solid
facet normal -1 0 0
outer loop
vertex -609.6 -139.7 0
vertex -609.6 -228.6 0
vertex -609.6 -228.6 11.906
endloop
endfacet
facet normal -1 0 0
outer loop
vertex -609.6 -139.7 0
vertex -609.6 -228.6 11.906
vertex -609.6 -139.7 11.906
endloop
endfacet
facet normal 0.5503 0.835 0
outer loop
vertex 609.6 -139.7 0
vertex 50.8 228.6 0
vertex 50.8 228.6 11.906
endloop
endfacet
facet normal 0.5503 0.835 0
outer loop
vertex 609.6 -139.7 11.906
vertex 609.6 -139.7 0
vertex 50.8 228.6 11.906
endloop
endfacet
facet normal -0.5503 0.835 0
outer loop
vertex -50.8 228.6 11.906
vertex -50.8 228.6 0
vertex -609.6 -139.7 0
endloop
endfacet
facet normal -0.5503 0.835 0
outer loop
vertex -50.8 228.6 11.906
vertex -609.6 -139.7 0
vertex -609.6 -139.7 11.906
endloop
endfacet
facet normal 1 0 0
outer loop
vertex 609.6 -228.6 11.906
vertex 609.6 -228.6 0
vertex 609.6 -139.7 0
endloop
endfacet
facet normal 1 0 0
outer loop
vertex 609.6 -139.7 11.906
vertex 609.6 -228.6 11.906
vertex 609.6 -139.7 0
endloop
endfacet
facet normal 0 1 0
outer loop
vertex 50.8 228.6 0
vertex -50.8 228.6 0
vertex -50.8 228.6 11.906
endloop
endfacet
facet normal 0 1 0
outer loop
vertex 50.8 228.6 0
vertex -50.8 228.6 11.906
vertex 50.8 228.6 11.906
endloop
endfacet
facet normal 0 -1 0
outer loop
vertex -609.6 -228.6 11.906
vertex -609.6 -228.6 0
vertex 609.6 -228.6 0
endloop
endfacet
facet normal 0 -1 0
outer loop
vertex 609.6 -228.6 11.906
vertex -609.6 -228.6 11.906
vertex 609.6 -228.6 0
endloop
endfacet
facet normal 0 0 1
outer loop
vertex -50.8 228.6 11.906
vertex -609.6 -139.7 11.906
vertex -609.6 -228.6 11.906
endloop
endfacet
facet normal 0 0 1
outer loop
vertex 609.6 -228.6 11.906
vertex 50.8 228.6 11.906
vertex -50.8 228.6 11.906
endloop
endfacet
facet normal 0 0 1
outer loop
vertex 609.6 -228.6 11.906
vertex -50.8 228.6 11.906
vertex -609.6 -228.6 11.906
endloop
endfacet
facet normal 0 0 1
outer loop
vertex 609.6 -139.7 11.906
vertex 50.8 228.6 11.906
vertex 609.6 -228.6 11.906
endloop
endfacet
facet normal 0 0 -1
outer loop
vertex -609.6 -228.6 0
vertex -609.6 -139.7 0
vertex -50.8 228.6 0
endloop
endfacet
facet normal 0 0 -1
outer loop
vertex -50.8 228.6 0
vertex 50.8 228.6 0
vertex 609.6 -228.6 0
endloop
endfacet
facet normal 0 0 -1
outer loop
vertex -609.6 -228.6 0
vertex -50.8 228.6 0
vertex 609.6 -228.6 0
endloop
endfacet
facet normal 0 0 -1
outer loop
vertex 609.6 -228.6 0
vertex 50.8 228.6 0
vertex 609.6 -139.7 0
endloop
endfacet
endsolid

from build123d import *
from OCP.BRepFilletAPI import BRepFilletAPI_MakeChamfer

# Parameters (mm, degrees)
SKETCH1_W           = 1219.2
SKETCH1_H           = 457.2
BOSS_EXTRUDE1_DEPTH = 11.90625
CHAMFER1_SIZE       = 368.3
CHAMFER1_SIZE2      = 558.8


with BuildPart() as part:
    # Sketch1 → Boss-Extrude1 (new body)
    with BuildSketch(Plane.XY):
        Rectangle(SKETCH1_W, SKETCH1_H)
    extrude(amount=BOSS_EXTRUDE1_DEPTH)

    # Chamfer1: one chamfer whose edges measure the first distance from different faces: ONE call of the kernel's chamfer builder (chamfer() names one face for all edges)
    chamfer1_edges_1 = [part.edges().sort_by_distance(p)[0] for p in [
        (-609.6, 228.6, 5.953125),
    ]]
    chamfer1_side_1 = [part.faces().sort_by_distance(p)[0] for p in [
        (-609.6, 0, 5.953125),
    ]]
    chamfer1_edges_2 = [part.edges().sort_by_distance(p)[0] for p in [
        (609.6, 228.6, 5.953125),
    ]]
    chamfer1_side_2 = [part.faces().sort_by_distance(p)[0] for p in [
        (609.6, 0, 5.953125),
    ]]
    chamfer1 = BRepFilletAPI_MakeChamfer(part.part.solid().wrapped)
    for e in chamfer1_edges_1:
        chamfer1.Add(CHAMFER1_SIZE, CHAMFER1_SIZE2, e.wrapped, chamfer1_side_1[0].wrapped)  # the first distance lies on this face
    for e in chamfer1_edges_2:
        chamfer1.Add(CHAMFER1_SIZE, CHAMFER1_SIZE2, e.wrapped, chamfer1_side_2[0].wrapped)  # the first distance lies on this face
    add(Compound.cast(chamfer1.Shape()), mode=Mode.REPLACE)


solid = part.part
